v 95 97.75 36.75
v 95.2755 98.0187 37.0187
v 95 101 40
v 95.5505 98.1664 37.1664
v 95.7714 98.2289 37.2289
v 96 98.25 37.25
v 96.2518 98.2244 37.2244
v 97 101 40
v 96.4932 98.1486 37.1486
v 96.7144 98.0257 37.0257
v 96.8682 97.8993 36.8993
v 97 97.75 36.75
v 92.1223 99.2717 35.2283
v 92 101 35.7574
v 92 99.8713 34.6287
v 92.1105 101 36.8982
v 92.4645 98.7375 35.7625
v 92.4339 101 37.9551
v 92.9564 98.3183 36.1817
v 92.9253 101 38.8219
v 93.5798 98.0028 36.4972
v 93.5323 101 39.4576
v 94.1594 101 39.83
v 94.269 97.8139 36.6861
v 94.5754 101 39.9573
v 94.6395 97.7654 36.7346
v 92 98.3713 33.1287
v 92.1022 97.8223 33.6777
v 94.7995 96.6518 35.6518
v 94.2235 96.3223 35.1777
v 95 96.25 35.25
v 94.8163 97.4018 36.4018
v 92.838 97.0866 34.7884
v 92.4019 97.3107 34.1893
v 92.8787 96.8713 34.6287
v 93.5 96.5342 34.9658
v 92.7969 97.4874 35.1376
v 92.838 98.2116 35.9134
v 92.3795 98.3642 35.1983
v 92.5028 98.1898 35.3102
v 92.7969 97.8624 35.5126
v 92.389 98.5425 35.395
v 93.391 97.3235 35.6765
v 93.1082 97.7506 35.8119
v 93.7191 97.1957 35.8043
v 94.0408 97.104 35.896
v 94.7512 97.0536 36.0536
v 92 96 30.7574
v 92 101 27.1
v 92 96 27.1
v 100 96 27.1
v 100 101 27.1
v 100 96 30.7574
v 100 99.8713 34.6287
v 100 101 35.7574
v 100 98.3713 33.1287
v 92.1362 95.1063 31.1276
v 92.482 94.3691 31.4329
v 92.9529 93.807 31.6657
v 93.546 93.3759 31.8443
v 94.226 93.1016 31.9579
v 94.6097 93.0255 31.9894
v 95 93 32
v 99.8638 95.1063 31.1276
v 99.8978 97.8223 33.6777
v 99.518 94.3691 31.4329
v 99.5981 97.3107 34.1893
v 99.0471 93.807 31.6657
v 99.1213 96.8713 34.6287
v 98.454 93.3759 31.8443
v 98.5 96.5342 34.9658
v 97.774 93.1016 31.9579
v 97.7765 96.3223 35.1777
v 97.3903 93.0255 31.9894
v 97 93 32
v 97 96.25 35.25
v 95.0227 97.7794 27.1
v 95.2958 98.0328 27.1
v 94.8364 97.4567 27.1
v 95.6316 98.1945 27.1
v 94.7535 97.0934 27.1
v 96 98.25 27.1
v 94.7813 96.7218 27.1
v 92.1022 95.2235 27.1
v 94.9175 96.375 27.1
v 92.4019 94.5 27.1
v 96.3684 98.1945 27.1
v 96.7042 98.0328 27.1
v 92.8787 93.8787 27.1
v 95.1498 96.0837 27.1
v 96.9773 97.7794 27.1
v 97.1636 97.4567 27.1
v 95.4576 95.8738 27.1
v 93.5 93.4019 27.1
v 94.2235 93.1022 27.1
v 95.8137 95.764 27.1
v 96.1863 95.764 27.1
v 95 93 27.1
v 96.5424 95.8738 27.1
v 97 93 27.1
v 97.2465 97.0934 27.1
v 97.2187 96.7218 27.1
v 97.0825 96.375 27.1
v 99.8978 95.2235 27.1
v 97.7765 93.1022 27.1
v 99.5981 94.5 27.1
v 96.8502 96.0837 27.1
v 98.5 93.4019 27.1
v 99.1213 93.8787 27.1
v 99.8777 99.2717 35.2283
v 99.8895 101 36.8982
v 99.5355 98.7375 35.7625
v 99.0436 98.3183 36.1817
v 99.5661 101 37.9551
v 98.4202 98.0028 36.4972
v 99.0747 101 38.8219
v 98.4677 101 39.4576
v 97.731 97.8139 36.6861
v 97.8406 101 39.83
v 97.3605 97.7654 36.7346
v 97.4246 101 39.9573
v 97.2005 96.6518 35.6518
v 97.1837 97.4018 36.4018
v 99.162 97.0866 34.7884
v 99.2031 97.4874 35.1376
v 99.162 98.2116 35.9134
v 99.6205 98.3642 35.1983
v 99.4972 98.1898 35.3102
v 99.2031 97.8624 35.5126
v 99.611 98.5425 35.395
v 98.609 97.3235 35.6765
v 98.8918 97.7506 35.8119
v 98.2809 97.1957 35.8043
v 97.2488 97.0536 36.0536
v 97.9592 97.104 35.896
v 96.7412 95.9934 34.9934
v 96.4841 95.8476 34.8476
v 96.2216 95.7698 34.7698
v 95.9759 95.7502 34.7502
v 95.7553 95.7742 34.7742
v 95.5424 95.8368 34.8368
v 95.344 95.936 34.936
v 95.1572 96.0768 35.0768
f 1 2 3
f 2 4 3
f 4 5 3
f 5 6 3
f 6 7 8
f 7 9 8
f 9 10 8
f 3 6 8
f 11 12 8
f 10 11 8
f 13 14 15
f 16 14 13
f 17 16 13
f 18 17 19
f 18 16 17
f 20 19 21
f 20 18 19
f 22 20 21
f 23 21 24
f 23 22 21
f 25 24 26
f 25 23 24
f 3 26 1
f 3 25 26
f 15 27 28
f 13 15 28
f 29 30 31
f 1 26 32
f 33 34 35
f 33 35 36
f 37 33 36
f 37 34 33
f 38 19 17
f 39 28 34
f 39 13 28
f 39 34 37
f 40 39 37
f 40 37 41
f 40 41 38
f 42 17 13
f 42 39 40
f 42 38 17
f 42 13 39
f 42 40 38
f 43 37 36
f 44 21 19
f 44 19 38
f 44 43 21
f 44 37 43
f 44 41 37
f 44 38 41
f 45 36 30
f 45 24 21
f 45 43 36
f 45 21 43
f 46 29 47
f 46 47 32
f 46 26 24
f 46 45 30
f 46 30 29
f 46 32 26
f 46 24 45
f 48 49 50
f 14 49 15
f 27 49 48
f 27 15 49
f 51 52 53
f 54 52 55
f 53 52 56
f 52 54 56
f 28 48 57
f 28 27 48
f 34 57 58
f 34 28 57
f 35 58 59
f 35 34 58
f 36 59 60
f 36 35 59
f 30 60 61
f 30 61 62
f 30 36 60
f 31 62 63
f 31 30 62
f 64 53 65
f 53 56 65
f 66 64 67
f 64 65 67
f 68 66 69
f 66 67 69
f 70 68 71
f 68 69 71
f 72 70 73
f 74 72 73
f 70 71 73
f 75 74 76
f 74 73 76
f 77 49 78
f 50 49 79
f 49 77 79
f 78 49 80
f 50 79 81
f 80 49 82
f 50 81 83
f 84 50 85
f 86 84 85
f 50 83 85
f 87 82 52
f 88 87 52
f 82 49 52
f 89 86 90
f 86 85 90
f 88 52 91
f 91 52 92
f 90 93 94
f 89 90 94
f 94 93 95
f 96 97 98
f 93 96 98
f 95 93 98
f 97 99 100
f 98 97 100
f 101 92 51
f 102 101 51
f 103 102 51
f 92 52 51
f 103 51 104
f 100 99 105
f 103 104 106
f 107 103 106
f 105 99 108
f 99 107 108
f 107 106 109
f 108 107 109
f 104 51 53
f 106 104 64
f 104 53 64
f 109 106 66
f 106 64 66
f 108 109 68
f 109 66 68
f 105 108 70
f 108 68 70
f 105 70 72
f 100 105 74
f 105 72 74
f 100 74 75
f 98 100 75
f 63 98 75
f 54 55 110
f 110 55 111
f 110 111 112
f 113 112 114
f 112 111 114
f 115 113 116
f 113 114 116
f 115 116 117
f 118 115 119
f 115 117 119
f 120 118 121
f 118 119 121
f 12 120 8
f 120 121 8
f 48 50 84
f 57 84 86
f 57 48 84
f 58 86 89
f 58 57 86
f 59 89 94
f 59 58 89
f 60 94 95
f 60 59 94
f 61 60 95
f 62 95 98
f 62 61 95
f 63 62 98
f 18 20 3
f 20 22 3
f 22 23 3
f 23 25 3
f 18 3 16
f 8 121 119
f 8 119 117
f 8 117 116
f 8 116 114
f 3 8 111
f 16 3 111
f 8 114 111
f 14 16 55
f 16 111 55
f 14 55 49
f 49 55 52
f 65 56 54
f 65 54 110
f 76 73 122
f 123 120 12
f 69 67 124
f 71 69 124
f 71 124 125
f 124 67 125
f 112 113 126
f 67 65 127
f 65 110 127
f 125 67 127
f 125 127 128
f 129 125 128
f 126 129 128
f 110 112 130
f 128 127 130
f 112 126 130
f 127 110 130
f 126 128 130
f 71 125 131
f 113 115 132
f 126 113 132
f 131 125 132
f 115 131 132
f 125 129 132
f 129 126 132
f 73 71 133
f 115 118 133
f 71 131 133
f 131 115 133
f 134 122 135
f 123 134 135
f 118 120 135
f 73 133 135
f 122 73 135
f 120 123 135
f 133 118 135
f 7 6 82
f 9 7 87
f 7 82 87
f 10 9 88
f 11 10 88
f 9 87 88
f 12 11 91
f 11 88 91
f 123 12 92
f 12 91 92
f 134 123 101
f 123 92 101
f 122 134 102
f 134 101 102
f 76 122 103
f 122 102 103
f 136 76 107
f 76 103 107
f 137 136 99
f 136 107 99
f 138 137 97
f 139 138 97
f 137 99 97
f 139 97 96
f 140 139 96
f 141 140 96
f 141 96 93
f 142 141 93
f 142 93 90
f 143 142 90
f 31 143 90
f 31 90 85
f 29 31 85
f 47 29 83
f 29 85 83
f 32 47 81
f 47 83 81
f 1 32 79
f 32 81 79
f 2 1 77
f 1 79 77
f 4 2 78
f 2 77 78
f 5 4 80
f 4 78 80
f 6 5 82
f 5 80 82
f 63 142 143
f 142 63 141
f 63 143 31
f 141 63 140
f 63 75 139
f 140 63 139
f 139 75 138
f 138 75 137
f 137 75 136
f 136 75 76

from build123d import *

# Parameters (mm, degrees)
PAD027_DEPTH    = 4
SKETCH057_R     = 1.25
POCKET019_DEPTH = 12.901
FILLET_R        = 3


with BuildPart() as part:
    # Sketch055 → Pad027 (new body, symmetric)
    with BuildSketch(Plane.YZ.offset(-96)):
        Polygon((101, 27.1), (93, 27.1), (93, 32), (101, 40), align=None)
    extrude(amount=PAD027_DEPTH, both=True)

    # Sketch057 (on Face1 of Pad027) → Pocket019 (cut, through all)
    with BuildSketch(Plane.YX.offset(-27.1)):
        with Locations((97, -96)):
            Circle(SKETCH057_R)
    extrude(amount=-POCKET019_DEPTH, mode=Mode.SUBTRACT)

    # Fillet
    fillet_edges = [part.edges().sort_by_distance(p)[0] for p in [
        (-100, 93, 29.55),
        (-100, 97, 36),
        (-92, 97, 36),
        (-92, 93, 29.55),
    ]]
    fillet(fillet_edges, radius=FILLET_R)


with BuildPart() as part_1:
    # Body039 placement: moved
    add(part.part.moved(Location((192, 0, 0))))


solid = part_1.part
